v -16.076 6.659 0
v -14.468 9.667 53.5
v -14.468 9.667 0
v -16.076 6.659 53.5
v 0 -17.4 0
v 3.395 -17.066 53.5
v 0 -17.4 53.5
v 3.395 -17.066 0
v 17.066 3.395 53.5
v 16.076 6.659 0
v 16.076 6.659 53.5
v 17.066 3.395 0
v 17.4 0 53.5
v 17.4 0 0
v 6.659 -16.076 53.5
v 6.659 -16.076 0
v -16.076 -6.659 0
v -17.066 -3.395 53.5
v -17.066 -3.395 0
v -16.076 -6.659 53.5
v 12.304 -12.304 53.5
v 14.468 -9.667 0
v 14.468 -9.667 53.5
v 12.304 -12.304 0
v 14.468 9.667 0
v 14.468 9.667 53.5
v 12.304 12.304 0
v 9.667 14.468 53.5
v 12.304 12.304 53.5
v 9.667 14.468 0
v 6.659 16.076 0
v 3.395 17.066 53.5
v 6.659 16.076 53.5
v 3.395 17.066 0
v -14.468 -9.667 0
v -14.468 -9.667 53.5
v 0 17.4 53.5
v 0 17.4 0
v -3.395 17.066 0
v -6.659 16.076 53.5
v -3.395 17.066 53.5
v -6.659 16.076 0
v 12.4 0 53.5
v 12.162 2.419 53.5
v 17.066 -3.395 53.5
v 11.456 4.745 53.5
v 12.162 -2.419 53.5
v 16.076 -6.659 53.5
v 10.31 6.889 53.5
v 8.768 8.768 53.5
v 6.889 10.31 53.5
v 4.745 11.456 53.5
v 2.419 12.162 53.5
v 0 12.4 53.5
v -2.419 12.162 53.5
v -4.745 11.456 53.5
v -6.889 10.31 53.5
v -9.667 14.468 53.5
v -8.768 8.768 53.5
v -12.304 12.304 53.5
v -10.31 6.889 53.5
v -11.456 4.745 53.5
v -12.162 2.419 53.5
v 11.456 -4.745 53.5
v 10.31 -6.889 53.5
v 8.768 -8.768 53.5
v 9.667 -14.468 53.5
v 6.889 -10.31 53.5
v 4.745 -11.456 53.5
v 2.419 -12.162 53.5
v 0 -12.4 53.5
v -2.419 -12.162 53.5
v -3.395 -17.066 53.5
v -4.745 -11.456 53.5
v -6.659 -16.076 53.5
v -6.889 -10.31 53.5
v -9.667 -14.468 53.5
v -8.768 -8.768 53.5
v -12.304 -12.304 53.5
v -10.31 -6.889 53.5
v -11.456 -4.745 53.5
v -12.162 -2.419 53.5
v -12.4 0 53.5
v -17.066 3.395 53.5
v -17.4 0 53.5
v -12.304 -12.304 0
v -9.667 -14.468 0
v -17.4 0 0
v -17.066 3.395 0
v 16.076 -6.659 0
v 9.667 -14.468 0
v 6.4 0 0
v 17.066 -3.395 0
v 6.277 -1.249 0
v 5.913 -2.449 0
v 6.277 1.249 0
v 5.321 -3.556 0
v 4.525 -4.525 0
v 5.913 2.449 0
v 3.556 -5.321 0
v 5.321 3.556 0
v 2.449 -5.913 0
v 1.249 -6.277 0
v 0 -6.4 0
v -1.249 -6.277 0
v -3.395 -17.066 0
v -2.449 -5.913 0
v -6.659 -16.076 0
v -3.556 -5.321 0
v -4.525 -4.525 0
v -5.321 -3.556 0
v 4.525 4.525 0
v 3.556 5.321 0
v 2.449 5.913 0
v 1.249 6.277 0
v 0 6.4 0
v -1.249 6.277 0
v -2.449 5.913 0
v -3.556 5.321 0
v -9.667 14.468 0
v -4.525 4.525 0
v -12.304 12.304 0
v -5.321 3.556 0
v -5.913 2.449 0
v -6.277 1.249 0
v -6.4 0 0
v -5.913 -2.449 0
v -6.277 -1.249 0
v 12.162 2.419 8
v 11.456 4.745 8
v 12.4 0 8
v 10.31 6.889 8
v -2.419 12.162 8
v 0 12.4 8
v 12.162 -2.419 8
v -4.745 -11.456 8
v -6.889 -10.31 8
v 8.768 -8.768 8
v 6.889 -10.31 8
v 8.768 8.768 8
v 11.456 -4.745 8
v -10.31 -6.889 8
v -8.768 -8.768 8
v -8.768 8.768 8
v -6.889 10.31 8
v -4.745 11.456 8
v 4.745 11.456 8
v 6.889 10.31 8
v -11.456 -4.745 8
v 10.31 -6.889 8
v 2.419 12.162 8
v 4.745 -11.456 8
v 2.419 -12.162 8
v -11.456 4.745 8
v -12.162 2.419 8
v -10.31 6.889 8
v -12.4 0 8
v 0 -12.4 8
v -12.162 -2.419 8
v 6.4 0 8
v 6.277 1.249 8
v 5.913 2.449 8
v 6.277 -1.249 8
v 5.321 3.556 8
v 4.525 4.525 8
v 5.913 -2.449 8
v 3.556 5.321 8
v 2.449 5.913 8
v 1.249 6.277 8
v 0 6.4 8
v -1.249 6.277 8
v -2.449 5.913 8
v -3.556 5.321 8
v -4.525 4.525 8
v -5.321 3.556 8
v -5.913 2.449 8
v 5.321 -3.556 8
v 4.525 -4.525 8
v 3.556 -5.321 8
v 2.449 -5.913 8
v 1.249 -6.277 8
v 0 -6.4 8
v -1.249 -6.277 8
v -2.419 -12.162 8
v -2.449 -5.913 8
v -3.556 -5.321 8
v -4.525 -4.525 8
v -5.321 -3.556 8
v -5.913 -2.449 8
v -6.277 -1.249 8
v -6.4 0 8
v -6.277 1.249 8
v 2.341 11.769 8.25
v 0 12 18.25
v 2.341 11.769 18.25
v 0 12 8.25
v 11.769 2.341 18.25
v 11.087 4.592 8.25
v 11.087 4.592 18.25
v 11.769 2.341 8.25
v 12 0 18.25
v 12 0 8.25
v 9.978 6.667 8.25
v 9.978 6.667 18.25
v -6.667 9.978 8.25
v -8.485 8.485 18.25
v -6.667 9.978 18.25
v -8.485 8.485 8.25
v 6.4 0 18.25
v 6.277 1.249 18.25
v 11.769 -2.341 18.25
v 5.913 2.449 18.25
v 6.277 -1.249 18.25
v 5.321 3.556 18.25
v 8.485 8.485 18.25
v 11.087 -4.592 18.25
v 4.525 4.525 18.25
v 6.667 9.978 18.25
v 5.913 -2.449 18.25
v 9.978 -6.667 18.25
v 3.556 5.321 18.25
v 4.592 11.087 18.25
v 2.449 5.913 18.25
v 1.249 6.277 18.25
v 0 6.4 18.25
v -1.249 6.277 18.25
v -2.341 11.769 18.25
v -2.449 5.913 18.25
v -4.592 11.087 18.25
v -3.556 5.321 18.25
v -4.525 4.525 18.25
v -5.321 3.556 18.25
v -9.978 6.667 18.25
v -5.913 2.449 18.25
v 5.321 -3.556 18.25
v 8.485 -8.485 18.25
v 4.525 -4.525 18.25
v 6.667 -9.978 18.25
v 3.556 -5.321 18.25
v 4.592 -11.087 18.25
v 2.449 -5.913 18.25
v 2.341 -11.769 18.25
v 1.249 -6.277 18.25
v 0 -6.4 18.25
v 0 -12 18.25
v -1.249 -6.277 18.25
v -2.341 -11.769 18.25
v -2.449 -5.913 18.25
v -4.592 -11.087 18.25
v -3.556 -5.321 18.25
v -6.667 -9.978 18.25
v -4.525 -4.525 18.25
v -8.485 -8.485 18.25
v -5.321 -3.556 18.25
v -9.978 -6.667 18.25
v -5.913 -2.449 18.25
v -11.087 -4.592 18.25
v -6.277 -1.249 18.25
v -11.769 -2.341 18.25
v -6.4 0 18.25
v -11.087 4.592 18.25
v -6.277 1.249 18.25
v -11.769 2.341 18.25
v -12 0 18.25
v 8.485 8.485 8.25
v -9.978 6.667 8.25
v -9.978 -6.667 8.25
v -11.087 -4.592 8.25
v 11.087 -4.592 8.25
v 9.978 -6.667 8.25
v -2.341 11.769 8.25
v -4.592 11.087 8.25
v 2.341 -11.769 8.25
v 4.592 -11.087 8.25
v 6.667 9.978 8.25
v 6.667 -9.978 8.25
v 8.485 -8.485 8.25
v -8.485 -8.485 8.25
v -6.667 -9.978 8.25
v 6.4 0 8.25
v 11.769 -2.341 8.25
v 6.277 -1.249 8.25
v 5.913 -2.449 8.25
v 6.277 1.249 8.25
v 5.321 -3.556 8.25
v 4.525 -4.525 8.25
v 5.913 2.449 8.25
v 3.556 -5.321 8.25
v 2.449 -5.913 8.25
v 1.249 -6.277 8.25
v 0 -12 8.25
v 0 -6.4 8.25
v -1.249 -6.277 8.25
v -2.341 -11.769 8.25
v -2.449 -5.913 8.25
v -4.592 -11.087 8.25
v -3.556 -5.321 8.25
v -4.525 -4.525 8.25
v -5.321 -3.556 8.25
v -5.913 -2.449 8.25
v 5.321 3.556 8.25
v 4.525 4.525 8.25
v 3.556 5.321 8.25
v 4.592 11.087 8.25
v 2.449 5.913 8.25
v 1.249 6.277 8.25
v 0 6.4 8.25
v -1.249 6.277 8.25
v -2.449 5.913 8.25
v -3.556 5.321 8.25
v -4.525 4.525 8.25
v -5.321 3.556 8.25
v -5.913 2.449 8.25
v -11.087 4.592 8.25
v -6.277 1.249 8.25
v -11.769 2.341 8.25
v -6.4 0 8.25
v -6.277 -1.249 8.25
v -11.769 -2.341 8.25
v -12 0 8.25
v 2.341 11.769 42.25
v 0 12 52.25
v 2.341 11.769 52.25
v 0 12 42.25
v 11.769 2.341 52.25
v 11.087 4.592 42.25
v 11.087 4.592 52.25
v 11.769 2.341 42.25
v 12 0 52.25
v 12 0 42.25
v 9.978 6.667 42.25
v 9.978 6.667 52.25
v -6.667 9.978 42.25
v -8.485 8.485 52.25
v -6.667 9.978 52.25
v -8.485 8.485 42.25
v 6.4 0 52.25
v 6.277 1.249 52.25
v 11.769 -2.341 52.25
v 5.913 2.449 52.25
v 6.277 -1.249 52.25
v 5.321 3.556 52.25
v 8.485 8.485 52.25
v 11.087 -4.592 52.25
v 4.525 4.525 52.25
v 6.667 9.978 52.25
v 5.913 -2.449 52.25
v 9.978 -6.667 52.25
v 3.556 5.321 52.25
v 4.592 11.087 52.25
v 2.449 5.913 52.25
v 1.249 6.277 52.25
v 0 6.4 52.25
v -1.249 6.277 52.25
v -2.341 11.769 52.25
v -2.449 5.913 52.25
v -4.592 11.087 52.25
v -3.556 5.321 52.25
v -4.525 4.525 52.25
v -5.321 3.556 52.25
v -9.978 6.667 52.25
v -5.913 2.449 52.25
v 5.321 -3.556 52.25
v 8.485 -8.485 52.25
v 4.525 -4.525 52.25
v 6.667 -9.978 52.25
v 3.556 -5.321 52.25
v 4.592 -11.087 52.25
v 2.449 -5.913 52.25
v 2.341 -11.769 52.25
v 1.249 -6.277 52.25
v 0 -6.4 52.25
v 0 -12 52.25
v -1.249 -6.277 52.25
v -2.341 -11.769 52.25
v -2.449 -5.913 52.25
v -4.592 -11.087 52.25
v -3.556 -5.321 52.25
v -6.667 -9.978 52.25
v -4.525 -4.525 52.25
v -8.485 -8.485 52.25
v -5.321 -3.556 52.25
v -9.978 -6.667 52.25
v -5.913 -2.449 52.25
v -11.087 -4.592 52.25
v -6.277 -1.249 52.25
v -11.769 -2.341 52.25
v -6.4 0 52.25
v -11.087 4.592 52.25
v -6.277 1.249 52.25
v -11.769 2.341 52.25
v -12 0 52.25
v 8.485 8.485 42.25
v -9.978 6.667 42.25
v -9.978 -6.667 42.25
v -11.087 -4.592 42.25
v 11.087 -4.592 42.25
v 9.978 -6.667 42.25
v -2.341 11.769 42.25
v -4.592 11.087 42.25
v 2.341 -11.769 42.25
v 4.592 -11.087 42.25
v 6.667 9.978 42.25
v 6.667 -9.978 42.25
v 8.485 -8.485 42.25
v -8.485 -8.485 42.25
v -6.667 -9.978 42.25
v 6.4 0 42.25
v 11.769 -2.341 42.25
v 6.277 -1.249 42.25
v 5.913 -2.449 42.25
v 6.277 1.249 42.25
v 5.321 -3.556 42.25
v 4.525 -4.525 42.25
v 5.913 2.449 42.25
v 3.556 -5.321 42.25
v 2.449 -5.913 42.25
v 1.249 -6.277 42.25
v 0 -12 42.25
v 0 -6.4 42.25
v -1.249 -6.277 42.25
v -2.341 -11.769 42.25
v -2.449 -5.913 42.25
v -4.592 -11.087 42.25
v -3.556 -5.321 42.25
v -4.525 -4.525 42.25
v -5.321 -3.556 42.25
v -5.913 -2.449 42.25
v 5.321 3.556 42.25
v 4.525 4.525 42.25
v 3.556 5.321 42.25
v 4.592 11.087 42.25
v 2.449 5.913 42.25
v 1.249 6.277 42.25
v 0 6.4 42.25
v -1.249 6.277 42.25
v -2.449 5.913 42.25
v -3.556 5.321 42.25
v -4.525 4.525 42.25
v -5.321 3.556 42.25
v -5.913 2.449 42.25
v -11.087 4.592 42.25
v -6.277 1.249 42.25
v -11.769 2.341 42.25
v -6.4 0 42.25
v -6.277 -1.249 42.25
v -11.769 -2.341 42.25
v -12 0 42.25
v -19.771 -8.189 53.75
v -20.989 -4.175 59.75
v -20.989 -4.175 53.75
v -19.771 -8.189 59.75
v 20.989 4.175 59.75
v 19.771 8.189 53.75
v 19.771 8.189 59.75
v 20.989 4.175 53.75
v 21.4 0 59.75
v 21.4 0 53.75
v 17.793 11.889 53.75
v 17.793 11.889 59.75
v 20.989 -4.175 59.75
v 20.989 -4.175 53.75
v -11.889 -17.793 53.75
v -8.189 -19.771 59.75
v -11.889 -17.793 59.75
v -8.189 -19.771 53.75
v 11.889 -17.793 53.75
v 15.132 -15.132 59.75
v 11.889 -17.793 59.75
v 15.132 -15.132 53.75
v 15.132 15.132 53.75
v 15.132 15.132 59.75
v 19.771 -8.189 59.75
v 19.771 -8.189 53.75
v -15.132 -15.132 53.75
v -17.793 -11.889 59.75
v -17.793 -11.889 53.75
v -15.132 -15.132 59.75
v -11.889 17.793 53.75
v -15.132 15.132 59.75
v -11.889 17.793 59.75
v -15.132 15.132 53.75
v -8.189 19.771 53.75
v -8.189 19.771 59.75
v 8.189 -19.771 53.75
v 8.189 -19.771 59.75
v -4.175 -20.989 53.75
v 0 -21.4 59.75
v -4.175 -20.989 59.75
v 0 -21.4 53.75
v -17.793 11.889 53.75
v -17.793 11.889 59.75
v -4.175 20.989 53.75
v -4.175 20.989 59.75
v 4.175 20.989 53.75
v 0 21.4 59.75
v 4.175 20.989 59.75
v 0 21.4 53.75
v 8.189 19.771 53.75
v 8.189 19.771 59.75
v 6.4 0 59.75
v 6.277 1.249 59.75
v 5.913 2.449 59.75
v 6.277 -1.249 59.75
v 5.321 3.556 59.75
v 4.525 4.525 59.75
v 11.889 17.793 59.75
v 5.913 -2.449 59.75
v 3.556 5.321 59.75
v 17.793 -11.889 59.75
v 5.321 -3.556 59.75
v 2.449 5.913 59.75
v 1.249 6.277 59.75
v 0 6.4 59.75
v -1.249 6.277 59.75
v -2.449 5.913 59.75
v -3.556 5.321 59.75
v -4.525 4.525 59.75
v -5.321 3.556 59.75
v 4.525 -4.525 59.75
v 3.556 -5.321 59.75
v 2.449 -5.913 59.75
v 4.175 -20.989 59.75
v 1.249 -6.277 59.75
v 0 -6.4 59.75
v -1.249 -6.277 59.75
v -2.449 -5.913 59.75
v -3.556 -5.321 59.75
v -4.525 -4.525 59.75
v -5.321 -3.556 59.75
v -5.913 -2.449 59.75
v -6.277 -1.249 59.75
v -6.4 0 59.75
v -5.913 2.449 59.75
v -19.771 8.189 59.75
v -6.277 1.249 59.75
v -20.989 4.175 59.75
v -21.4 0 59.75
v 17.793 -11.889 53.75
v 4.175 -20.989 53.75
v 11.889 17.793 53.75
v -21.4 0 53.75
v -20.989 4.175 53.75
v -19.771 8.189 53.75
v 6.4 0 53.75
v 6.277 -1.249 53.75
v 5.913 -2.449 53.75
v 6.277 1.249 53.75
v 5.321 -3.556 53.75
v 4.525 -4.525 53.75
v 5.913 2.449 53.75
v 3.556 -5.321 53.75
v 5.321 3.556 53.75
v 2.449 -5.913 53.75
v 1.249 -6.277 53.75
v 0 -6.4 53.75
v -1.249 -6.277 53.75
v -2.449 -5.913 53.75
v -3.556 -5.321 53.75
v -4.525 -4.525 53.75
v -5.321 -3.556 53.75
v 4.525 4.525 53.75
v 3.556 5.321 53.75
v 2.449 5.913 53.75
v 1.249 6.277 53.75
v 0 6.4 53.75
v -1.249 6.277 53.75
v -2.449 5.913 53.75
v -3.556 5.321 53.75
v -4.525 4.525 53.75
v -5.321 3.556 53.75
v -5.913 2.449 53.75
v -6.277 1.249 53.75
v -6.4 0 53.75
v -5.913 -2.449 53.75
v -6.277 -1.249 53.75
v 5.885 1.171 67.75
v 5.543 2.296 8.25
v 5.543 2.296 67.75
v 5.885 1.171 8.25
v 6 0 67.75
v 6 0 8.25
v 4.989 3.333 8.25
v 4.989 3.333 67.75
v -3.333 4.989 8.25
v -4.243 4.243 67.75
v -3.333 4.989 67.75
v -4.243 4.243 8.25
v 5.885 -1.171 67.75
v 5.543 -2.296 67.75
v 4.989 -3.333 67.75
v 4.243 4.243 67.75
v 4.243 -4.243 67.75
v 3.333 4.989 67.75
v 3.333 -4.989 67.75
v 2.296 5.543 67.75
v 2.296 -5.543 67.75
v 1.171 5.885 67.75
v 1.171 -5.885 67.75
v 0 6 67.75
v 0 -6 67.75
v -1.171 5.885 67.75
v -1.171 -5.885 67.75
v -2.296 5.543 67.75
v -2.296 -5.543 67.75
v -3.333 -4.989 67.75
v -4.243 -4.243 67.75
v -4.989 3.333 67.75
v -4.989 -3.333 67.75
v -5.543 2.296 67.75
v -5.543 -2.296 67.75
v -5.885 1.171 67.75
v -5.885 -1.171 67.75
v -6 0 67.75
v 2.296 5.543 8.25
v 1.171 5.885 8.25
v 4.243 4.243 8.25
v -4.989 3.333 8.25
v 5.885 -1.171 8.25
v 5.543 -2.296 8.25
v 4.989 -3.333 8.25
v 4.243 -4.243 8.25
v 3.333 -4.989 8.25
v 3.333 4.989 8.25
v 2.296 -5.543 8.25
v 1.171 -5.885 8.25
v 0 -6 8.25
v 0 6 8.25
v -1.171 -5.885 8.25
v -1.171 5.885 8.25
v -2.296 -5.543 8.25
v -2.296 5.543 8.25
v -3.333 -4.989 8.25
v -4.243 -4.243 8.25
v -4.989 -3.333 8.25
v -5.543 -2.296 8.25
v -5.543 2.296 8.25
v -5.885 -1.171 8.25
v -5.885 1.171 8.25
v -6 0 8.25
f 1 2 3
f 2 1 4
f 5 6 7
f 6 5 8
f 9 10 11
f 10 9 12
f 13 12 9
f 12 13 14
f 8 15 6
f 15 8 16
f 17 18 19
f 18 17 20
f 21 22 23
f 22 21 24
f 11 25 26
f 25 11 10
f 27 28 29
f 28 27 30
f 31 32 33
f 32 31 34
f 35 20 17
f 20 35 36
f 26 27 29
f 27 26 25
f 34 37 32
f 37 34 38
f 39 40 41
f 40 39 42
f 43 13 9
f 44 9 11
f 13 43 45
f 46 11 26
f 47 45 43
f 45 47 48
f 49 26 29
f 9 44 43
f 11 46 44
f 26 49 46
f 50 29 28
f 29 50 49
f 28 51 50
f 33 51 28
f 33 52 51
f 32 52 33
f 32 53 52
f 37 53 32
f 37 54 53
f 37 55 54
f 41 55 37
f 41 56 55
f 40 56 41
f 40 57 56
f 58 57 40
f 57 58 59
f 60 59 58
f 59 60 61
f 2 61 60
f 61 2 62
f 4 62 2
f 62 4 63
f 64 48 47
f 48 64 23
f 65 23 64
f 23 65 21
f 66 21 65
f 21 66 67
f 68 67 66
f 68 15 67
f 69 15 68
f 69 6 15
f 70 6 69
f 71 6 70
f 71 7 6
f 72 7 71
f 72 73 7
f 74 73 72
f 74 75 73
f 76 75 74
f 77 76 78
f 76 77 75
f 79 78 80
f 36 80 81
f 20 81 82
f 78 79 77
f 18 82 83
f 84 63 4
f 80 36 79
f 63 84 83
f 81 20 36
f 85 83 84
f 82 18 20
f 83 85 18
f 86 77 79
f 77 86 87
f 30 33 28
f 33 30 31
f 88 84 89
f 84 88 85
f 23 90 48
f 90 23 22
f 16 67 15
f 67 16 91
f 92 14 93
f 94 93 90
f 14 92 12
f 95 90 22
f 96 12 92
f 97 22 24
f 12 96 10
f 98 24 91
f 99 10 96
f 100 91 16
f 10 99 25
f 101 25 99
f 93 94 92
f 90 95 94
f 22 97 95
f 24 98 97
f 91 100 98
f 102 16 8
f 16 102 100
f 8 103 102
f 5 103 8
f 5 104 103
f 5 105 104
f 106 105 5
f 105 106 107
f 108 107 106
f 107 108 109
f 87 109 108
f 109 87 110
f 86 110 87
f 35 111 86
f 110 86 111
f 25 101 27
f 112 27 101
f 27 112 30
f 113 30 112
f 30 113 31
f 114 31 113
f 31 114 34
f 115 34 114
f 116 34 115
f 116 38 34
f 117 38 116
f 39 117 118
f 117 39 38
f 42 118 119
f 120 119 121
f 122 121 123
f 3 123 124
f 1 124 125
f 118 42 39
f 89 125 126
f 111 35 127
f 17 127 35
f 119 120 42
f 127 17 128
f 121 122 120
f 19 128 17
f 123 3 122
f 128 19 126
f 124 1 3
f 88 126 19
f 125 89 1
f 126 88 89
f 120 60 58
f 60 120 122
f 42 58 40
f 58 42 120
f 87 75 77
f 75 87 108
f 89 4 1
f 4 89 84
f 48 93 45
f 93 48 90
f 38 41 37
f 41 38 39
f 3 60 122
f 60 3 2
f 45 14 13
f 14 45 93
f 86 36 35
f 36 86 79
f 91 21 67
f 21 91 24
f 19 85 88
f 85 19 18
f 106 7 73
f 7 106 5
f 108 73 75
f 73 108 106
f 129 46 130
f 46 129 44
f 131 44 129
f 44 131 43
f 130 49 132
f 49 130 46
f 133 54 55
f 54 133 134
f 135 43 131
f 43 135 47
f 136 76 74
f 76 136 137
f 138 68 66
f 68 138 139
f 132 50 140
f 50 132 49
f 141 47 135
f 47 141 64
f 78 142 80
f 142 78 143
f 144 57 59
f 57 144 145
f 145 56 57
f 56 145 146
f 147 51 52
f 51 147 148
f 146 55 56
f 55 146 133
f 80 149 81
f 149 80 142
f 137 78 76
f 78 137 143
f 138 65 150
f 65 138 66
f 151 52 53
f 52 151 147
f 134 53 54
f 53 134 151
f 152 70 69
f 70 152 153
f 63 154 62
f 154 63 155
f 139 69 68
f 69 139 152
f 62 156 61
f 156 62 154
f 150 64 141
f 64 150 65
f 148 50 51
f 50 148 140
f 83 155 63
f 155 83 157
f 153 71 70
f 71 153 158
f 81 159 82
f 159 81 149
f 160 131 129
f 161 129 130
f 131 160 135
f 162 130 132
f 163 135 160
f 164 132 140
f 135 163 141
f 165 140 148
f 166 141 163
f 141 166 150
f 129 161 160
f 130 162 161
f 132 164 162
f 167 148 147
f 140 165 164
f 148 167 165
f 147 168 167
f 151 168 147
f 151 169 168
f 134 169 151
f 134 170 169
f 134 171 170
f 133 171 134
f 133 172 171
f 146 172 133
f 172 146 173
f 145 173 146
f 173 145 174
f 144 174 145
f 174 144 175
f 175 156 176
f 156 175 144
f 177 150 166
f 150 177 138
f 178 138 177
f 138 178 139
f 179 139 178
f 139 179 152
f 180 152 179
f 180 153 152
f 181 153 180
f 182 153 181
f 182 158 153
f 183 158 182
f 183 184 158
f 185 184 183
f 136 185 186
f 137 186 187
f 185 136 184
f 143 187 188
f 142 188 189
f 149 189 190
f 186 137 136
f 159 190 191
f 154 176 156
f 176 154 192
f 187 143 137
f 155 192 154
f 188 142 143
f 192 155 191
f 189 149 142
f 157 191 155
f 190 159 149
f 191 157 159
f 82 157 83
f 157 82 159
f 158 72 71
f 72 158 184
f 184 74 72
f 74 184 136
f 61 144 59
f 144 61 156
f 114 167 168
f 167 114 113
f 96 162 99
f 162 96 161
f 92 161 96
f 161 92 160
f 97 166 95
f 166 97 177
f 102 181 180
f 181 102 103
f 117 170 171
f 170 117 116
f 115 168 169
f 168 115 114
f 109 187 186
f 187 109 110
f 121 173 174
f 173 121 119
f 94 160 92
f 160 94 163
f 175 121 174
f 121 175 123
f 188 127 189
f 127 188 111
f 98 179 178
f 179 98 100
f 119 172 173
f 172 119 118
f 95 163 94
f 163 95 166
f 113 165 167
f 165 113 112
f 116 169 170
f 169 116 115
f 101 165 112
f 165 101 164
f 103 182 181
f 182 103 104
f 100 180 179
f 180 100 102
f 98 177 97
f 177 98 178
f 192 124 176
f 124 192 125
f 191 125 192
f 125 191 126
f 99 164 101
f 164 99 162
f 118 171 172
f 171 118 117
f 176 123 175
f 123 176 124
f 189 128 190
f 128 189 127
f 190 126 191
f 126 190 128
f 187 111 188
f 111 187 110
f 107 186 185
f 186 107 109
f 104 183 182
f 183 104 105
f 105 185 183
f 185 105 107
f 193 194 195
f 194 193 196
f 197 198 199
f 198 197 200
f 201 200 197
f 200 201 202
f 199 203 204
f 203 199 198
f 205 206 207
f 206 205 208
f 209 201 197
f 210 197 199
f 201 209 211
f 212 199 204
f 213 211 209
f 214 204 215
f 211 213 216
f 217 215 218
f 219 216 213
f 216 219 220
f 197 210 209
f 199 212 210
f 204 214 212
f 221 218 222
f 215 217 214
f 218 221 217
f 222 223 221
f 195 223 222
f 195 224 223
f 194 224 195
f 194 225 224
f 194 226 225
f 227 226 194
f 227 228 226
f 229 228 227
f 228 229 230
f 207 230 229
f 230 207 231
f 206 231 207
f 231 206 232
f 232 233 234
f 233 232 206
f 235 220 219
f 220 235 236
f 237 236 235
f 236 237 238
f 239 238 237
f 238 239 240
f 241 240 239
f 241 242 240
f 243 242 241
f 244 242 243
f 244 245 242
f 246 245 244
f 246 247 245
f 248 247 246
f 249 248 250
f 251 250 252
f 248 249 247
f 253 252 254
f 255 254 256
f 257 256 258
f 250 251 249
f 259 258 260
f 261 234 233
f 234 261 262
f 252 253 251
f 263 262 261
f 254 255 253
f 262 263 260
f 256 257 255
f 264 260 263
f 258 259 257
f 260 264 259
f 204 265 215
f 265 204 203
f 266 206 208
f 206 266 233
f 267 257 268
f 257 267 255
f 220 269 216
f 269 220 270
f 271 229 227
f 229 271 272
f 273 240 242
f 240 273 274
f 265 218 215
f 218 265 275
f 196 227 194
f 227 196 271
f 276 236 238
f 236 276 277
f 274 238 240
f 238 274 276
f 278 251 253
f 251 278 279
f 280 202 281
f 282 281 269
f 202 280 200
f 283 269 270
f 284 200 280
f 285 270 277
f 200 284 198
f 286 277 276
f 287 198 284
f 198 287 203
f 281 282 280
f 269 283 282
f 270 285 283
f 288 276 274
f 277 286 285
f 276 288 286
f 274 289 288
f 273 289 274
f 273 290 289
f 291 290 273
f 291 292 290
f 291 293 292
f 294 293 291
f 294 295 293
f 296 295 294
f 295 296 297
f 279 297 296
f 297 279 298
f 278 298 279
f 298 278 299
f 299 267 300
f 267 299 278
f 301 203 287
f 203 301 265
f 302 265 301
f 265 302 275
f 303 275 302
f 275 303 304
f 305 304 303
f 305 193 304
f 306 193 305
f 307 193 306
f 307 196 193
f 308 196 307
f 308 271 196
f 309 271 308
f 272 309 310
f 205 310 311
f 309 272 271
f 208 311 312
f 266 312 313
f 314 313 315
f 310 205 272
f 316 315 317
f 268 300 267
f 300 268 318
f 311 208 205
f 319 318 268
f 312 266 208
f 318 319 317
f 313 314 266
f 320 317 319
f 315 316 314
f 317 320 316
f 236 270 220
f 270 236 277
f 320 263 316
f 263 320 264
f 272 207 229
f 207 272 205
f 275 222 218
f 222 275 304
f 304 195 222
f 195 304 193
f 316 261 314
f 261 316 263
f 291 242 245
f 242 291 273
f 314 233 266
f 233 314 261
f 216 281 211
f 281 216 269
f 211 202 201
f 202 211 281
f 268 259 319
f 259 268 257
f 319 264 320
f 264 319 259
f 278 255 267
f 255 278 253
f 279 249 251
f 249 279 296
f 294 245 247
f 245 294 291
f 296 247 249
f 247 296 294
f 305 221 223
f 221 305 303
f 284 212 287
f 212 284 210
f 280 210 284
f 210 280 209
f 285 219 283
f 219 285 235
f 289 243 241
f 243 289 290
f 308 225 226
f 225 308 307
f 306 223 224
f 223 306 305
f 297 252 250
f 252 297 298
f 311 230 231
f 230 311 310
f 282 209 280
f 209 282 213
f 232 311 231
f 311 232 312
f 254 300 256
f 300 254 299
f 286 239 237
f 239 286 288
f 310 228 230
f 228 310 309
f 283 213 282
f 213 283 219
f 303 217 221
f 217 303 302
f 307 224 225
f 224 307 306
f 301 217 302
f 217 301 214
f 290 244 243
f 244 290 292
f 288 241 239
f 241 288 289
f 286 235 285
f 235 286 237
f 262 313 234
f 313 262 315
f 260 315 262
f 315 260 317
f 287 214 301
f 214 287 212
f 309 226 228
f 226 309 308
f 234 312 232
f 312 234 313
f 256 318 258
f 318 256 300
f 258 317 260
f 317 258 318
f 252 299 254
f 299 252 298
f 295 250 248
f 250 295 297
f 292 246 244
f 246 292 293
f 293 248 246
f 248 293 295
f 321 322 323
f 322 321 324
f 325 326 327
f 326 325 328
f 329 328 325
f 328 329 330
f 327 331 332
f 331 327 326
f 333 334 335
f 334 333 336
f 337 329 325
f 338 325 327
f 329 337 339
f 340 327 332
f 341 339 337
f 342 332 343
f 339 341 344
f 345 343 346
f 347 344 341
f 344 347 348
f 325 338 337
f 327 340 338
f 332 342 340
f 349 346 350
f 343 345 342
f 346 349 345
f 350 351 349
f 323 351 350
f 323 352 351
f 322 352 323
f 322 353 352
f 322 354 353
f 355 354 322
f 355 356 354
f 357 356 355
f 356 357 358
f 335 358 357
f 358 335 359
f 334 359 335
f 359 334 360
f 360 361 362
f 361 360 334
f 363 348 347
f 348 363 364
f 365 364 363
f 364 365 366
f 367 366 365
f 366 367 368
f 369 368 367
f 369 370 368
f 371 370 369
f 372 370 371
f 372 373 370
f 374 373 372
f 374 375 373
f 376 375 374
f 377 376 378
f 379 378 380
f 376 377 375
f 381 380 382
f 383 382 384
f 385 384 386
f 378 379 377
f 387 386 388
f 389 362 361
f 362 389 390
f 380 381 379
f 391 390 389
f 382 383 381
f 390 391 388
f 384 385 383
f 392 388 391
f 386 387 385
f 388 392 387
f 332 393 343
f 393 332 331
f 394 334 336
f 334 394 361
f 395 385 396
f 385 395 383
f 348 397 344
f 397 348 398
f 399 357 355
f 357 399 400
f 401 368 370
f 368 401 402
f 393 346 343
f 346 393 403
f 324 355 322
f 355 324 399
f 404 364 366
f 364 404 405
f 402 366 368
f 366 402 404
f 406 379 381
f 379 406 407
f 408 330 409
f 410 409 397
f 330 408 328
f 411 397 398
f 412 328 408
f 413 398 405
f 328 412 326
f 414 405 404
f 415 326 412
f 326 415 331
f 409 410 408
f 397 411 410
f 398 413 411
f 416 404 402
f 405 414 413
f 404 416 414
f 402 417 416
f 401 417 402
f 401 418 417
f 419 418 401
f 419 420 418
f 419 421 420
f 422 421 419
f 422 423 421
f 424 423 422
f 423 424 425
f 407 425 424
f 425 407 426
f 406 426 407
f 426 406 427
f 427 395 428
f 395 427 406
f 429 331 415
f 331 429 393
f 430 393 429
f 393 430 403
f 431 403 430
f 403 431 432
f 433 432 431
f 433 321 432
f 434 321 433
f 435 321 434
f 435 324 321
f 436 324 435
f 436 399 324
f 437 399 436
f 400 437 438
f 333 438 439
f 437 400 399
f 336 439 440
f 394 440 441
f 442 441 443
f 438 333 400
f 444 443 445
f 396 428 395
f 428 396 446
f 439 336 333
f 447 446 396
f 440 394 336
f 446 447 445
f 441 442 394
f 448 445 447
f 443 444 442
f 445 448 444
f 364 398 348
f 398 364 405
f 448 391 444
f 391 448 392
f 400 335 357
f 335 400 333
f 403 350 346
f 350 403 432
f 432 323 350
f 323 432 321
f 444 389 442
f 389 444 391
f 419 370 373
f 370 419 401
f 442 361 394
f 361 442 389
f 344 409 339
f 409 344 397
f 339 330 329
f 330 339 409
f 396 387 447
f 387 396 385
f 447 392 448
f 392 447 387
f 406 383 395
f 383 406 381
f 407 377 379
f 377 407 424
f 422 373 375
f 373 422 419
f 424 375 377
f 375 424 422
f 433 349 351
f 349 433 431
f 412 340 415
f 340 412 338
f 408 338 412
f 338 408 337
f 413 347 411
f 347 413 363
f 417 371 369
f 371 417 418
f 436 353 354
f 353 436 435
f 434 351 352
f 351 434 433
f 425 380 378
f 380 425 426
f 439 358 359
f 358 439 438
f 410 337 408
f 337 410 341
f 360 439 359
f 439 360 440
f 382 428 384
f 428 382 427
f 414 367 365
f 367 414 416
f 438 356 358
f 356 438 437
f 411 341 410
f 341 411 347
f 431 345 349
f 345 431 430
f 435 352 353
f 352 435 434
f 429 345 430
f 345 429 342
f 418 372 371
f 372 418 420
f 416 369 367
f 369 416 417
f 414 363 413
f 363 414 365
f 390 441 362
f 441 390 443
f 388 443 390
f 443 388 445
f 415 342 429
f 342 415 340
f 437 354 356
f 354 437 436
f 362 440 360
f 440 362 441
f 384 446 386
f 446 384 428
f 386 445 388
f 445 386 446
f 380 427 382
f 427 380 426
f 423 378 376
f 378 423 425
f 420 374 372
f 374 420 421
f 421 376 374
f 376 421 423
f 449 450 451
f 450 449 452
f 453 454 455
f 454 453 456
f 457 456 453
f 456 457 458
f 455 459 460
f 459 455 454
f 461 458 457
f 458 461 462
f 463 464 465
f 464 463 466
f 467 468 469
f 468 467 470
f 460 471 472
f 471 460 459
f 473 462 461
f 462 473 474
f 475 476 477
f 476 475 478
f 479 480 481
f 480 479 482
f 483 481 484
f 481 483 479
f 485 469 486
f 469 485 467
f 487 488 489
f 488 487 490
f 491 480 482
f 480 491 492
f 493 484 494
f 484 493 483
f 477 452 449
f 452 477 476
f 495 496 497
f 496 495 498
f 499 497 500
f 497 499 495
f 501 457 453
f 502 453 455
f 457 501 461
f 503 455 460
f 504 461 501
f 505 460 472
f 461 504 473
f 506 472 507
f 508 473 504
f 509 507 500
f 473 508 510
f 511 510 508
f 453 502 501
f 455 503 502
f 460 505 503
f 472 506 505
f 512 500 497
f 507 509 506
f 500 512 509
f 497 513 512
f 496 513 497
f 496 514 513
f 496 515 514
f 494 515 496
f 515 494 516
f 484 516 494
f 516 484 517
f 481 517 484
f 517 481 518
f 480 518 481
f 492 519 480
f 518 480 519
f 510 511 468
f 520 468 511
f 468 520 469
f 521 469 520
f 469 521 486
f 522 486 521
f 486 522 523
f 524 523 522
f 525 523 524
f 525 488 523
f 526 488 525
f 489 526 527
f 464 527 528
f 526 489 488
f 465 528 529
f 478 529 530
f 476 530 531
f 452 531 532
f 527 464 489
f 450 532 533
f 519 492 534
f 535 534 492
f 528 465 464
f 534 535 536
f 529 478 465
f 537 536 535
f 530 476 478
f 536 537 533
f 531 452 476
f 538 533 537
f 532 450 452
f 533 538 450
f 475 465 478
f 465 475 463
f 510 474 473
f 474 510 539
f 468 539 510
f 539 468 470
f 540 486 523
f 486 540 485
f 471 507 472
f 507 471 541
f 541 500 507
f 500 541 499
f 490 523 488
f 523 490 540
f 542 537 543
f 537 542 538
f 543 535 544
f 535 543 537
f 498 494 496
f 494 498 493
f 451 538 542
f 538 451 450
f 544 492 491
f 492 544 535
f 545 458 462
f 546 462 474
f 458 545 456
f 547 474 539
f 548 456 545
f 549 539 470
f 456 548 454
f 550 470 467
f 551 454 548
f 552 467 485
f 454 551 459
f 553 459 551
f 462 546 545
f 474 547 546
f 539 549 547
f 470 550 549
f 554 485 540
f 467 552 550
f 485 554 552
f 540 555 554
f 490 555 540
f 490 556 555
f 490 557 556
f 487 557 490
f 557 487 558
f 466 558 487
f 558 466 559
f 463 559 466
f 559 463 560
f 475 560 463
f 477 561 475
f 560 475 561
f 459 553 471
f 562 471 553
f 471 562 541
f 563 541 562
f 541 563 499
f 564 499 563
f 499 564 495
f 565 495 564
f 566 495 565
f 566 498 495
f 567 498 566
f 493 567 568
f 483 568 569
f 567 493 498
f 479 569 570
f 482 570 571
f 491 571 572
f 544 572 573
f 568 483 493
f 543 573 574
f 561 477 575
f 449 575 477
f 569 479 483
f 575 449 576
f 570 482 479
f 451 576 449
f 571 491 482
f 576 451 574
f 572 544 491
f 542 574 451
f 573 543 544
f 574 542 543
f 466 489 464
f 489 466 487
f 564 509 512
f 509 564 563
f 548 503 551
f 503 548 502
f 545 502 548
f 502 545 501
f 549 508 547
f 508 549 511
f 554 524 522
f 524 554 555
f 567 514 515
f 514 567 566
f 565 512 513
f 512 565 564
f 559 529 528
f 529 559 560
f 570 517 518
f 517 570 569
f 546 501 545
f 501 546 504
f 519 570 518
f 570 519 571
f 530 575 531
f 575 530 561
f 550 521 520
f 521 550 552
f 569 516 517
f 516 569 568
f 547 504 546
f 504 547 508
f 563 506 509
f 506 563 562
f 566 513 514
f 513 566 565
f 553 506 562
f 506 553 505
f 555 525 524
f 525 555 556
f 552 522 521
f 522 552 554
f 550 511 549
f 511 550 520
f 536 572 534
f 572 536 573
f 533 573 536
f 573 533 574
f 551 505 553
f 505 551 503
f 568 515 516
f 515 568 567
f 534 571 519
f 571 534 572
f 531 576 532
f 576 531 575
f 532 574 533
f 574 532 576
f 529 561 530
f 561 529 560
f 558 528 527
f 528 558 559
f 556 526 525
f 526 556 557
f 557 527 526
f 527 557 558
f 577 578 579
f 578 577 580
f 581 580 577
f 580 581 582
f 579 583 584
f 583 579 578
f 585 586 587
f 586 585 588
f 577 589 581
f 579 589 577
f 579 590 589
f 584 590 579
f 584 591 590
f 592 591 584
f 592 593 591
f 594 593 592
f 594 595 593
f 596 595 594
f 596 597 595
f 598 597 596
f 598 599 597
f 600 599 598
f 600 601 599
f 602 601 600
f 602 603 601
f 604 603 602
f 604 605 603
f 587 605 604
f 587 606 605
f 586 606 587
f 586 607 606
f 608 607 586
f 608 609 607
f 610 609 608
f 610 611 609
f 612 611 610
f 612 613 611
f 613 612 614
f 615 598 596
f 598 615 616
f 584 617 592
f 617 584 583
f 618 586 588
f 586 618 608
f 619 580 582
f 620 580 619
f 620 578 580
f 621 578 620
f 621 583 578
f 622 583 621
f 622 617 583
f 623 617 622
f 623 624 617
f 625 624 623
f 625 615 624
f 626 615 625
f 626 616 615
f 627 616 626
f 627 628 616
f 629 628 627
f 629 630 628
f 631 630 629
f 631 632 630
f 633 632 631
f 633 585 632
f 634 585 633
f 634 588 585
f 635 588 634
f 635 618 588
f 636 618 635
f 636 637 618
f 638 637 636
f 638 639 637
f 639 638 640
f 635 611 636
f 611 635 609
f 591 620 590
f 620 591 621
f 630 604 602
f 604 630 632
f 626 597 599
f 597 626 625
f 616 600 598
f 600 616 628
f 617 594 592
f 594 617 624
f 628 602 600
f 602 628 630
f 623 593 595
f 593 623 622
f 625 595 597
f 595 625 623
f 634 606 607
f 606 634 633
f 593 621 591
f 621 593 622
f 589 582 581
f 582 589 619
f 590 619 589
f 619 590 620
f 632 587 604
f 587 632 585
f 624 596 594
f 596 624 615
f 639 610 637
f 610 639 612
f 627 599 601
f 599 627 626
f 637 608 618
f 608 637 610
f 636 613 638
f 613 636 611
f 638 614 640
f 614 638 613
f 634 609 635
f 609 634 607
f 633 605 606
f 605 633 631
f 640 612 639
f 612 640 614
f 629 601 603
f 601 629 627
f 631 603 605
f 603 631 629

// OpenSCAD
$fn = 32;

// ------------------------------------------------------------------------
// Shaft station: cup d34.8 x 53.5 mm, shaft d12
// Every part is its own module, assembly() places every instance.
// ------------------------------------------------------------------------

// --- part 1 ---
module housing_cup() {
  difference() {
    cylinder(h = 53.5, d = 34.8);
    translate([0, 0, 8]) cylinder(h = 46.5, d = 24.8);
    translate([0, 0, -1]) cylinder(h = 10, d = 12.8);
  }
}

// --- part 2 ---
module bearing_lower() {
  difference() {
      translate([0, 0, 0]) cylinder(h = 10, d = 24);
      translate([0, 0, -1]) cylinder(h = 12, d = 12.8);
    }
}

// --- part 3 ---
module bearing_upper() {
  difference() {
      translate([0, 0, 0]) cylinder(h = 10, d = 24);
      translate([0, 0, -1]) cylinder(h = 12, d = 12.8);
    }
}

// --- part 4 ---
module station_shaft() {
  translate([0, 0, -29.75]) cylinder(h = 59.5, d = 12);
}

// --- part 5 ---
module station_cover() {
  difference() {
    cylinder(h = 6, d = 42.8);
    translate([0, 0, -1]) cylinder(h = 8, d = 12.8);
  }
}

// --- assembly ---
module assembly() {
  color([0.80, 0.24, 0.20]) translate([0, 0, 0]) rotate([0, 0, 0]) housing_cup();
  color([0.20, 0.45, 0.75]) translate([0, 0, 8.25]) rotate([0, 0, 0]) bearing_lower();
  color([0.25, 0.62, 0.32]) translate([0, 0, 42.25]) rotate([0, 0, 0]) bearing_upper();
  color([0.92, 0.70, 0.18]) translate([0, 0, 38]) rotate([0, 0, 0]) station_shaft();
  color([0.58, 0.35, 0.70]) translate([0, 0, 53.75]) rotate([0, 0, 0]) station_cover();
}

assembly();
